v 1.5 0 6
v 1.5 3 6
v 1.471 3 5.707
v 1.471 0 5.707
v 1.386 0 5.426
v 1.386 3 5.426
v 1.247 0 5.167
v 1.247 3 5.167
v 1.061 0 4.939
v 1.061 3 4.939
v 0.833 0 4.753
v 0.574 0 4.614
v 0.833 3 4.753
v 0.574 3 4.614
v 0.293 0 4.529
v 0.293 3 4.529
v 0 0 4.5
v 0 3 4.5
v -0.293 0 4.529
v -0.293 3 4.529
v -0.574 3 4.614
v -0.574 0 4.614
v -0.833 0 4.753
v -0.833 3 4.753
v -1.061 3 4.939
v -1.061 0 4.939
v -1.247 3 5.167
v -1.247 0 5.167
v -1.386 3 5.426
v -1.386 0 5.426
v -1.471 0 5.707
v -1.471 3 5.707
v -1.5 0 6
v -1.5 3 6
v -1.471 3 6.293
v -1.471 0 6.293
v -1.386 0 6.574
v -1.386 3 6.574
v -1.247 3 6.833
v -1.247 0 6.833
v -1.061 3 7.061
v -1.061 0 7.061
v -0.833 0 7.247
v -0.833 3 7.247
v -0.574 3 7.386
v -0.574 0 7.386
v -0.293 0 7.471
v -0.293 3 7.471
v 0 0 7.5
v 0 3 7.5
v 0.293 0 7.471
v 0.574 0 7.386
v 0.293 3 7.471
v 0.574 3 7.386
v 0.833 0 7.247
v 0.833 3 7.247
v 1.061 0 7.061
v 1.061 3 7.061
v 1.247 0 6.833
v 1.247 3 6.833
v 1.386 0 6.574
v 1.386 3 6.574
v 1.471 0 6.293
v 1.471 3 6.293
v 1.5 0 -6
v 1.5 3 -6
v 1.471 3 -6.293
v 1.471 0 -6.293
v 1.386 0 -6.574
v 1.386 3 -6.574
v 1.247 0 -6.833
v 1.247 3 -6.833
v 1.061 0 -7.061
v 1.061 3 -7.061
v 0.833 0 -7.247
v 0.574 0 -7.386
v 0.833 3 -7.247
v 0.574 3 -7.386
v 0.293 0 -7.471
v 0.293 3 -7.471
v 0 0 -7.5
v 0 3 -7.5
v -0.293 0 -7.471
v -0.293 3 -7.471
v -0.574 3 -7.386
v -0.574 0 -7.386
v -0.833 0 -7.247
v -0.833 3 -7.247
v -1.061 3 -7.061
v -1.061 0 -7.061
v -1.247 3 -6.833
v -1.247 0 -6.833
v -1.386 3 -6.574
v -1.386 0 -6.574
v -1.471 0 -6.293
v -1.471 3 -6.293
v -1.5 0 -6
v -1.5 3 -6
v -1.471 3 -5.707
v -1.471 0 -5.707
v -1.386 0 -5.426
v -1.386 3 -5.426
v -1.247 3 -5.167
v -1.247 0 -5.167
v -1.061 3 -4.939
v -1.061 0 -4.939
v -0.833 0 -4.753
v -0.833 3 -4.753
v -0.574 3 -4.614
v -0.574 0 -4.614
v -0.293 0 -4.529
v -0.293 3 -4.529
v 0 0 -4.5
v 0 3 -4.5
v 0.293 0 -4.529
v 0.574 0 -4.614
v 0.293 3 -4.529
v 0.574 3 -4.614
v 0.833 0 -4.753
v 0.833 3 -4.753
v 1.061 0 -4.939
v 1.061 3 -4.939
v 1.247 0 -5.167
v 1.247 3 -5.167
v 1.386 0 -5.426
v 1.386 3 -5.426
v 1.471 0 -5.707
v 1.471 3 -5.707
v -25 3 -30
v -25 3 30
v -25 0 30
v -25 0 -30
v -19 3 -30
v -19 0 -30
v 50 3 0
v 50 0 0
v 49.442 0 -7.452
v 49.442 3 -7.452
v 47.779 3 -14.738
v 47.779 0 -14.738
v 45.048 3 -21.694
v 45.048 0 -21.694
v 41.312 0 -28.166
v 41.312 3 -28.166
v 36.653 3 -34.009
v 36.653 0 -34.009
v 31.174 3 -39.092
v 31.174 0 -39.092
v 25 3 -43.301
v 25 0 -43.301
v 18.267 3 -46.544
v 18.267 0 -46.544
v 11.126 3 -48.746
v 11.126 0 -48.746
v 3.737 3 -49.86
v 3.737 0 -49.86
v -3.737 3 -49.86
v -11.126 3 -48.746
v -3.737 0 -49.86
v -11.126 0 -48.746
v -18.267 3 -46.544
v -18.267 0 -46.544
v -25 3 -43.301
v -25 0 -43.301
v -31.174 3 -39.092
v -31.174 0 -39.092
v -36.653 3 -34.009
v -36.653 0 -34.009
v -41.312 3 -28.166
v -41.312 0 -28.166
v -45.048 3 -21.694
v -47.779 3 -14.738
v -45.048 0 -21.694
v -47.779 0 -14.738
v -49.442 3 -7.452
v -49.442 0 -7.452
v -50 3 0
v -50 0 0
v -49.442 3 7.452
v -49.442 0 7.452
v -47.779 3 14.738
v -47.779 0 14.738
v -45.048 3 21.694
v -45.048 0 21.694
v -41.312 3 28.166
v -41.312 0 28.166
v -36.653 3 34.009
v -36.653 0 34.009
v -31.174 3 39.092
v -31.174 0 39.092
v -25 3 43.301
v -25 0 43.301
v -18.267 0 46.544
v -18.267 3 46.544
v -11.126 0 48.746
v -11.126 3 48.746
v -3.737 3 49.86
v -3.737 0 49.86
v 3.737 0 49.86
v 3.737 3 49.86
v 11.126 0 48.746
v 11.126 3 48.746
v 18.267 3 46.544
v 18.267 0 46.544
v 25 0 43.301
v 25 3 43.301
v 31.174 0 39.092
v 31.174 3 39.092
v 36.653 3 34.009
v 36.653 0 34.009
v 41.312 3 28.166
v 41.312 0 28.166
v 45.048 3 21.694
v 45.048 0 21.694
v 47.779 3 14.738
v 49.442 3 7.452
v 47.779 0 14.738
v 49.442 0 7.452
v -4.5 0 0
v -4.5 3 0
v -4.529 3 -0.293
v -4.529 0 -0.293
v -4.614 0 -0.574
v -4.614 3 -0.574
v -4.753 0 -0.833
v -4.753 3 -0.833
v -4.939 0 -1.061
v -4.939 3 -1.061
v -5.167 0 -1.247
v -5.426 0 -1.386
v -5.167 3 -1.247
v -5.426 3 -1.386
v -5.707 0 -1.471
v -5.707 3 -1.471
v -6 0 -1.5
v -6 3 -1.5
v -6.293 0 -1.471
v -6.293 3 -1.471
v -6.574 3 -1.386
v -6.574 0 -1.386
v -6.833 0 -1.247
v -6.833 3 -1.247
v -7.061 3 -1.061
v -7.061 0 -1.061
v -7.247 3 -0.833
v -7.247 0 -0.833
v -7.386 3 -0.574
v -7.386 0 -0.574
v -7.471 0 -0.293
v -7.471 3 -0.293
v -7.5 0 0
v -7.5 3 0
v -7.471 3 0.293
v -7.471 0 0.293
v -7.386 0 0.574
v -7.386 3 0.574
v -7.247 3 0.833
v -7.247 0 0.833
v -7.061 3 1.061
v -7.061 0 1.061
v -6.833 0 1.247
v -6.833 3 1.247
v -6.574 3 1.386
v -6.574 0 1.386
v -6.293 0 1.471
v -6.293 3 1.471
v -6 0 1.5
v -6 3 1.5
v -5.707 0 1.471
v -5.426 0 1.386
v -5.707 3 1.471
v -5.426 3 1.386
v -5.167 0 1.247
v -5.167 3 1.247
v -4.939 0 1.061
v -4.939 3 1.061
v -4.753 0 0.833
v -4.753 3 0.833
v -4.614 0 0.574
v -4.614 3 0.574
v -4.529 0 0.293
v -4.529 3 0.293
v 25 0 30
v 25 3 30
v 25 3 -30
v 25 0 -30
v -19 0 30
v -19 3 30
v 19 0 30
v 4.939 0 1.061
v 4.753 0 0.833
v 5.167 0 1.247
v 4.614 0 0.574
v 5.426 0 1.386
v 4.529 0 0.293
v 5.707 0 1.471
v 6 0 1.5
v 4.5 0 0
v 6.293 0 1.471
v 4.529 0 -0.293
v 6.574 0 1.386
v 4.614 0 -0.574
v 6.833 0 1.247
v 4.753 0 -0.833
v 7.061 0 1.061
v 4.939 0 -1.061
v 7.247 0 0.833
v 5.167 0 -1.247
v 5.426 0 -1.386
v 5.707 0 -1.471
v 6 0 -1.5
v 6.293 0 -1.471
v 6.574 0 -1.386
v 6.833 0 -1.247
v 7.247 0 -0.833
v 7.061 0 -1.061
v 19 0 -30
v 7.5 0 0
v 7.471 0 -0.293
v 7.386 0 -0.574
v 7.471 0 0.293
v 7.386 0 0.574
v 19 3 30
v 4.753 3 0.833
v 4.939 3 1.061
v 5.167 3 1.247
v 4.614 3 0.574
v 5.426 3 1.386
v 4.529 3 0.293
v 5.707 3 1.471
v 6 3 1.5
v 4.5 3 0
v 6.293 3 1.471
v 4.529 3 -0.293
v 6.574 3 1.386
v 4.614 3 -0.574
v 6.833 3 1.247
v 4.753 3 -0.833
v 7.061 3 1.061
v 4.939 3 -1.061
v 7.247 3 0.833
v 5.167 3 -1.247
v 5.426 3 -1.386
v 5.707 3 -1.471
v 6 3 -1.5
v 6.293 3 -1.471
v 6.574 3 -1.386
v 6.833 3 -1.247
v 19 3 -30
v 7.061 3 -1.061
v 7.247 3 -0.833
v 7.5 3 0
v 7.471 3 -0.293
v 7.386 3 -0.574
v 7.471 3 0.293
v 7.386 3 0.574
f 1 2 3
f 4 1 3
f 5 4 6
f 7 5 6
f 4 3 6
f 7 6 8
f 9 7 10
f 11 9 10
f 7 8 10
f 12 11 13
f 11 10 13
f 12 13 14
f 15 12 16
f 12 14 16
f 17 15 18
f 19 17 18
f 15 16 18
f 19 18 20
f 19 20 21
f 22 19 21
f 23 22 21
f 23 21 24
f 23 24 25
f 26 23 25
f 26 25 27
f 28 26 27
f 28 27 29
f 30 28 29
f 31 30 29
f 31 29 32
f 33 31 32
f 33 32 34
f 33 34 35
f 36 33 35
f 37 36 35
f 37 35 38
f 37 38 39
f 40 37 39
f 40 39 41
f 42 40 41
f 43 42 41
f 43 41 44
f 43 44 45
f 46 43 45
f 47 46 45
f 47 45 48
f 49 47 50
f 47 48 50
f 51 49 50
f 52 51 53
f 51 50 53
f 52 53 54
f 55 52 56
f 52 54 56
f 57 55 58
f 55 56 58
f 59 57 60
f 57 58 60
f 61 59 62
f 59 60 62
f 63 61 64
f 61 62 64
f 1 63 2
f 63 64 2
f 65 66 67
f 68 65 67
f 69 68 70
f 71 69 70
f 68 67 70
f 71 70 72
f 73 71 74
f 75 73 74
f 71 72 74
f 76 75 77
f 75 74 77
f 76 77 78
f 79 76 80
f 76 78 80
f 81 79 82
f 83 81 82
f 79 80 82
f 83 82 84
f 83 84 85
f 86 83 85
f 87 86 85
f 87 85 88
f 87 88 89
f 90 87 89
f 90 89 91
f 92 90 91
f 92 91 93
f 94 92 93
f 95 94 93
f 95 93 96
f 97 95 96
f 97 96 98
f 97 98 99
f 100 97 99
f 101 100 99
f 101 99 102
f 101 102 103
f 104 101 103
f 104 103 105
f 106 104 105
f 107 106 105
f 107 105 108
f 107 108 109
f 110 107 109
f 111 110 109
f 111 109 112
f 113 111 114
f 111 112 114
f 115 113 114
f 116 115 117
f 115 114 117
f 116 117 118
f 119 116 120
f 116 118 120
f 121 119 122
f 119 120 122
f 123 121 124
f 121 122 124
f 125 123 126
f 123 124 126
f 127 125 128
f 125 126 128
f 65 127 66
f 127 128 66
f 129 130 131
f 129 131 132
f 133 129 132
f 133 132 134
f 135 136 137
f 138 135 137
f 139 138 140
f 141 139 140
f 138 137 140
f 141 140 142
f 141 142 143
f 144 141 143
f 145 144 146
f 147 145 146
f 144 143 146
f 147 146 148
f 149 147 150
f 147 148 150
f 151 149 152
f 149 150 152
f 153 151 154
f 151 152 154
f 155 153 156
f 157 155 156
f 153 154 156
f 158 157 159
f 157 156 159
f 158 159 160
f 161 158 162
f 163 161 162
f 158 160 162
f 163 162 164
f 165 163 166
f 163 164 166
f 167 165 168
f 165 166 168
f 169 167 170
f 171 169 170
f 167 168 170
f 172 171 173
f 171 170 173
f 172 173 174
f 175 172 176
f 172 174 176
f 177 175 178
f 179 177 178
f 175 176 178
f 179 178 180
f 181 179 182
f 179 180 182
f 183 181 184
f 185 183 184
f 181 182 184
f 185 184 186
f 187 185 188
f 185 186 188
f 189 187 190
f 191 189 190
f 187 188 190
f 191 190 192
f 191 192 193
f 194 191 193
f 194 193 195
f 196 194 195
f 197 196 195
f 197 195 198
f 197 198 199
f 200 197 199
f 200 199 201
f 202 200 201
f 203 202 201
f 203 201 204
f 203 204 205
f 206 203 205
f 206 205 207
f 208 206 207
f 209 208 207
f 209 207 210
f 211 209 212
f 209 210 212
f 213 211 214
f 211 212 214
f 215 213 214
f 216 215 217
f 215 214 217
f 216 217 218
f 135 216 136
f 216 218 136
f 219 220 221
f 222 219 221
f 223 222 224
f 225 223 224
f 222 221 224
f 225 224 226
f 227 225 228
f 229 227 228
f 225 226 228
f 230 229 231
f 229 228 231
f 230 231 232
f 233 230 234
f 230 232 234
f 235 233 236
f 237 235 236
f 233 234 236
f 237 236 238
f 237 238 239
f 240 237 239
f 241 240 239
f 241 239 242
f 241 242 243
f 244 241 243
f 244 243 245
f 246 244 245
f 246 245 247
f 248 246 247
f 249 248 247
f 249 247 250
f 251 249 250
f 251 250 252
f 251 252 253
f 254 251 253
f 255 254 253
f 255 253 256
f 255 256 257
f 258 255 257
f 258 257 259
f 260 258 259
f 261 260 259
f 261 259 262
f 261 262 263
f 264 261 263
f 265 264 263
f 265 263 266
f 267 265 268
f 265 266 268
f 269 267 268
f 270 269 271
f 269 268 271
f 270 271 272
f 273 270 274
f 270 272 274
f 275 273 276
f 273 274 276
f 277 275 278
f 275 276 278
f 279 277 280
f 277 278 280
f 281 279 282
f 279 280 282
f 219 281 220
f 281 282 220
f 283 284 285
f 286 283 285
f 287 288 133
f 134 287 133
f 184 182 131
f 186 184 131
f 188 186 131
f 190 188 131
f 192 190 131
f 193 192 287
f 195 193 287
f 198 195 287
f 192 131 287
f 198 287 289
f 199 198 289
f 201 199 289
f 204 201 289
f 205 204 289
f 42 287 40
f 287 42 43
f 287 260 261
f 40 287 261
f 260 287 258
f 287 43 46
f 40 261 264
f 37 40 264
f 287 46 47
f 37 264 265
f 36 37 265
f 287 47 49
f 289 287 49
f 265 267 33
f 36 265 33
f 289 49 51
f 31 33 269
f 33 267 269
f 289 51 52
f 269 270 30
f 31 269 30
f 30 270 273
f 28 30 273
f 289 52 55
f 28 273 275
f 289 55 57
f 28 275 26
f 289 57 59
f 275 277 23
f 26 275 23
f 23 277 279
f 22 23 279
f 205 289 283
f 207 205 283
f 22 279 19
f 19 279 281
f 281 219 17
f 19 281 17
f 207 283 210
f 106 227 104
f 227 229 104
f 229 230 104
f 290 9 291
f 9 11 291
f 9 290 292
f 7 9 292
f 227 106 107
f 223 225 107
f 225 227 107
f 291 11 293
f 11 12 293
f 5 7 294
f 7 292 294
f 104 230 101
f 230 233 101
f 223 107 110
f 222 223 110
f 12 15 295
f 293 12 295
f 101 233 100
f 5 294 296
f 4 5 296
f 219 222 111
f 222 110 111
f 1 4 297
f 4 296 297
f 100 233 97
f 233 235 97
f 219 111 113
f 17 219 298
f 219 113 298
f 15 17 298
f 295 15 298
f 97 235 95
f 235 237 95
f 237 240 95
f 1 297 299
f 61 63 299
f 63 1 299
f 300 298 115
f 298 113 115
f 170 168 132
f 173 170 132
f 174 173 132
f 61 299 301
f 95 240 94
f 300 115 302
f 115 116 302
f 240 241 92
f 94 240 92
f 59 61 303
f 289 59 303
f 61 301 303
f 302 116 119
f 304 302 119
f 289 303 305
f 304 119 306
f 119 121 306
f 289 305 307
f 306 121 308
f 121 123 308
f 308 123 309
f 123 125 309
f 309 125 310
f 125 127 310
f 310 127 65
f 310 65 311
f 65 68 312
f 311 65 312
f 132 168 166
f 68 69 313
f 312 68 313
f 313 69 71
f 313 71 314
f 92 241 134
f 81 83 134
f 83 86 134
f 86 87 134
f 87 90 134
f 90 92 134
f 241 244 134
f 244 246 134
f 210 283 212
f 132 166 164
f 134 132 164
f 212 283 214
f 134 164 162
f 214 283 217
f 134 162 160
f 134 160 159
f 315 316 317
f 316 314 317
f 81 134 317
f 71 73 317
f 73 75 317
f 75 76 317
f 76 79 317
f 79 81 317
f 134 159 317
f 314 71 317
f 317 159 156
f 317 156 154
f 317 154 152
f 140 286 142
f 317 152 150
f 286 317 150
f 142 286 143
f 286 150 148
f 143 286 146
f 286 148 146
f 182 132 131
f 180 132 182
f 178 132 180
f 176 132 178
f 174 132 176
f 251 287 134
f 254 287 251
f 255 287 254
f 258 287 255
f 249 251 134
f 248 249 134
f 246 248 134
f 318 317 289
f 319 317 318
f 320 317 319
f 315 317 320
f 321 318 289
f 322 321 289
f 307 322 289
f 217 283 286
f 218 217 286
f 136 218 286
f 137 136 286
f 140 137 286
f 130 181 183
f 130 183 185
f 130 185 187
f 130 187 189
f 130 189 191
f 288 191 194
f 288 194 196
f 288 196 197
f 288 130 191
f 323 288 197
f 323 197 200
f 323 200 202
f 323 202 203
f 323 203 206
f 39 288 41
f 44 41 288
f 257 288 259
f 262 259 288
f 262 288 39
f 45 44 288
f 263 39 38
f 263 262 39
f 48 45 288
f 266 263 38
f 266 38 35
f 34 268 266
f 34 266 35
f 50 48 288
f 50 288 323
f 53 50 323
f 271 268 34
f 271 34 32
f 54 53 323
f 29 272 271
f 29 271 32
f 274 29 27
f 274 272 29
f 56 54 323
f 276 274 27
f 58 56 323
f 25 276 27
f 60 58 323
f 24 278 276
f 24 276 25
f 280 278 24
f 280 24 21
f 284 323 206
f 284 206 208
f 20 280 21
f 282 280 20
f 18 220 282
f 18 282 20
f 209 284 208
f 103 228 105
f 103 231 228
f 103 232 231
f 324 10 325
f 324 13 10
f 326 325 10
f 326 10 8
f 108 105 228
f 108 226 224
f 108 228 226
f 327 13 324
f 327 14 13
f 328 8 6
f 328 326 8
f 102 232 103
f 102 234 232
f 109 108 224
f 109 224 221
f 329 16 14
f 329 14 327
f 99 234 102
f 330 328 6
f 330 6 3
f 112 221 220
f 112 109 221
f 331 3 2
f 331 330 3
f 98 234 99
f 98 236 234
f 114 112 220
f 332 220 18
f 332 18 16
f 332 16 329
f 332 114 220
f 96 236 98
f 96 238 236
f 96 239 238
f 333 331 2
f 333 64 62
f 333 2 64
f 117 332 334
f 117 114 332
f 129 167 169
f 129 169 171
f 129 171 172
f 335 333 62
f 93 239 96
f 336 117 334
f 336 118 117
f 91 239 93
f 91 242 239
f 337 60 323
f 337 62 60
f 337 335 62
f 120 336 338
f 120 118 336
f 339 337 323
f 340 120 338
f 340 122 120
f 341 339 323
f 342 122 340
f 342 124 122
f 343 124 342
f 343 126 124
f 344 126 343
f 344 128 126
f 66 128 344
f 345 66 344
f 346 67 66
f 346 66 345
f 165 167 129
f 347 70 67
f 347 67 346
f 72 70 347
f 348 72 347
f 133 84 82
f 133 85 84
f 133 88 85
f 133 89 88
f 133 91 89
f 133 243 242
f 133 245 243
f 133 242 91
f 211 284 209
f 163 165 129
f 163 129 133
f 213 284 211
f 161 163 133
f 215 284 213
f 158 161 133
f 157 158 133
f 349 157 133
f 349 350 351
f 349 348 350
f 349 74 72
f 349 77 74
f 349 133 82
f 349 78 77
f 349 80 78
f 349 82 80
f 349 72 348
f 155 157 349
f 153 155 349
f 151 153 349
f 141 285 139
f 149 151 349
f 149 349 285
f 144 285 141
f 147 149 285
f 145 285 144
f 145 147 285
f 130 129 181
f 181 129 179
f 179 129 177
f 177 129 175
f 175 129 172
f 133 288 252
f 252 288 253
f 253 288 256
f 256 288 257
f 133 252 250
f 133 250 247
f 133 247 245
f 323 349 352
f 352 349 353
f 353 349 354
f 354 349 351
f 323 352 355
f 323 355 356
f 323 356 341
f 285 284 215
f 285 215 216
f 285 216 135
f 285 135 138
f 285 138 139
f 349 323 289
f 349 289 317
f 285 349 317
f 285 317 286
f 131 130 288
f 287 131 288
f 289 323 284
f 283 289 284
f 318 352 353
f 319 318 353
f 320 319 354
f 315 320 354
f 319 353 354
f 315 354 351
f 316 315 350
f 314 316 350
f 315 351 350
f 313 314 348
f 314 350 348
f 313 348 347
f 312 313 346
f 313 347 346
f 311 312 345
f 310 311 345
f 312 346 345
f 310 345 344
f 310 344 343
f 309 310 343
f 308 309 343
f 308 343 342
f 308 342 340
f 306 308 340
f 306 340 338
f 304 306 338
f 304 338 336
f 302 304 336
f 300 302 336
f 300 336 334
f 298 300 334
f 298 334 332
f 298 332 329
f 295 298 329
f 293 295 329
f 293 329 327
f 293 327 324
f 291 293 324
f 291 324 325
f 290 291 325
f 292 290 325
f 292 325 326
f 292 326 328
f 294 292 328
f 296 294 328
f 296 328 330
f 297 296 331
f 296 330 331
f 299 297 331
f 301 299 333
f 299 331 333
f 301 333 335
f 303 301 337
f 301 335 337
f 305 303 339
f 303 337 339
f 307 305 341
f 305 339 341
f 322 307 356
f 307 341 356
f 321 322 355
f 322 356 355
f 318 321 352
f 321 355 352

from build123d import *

# Parameters (mm, degrees)
CROQUIS1_R              = 50
SALIENTE_EXTRUIR1_DEPTH = 3
CORTAR_EXTRUIR1_REACH   = 5
CROQUIS2_R              = 1.5
CORTAR_EXTRUIR2_REACH   = 5
CROQUIS3_W              = 6
CROQUIS3_H              = 60


with BuildPart() as part:
    # Croquis1 → Saliente-Extruir1 (new body)
    with BuildSketch(Plane(origin=(0, 0, 0), x_dir=(1, 0, 0), z_dir=(0, 1, 0))):
        Circle(CROQUIS1_R)
    extrude(amount=SALIENTE_EXTRUIR1_DEPTH)

    # Croquis2 → Cortar-Extruir1 (cut, up to next)
    with BuildSketch(Plane(origin=(0, 3, 0), x_dir=(1, 0, 0), z_dir=(0, 1, 0)), mode=Mode.PRIVATE) as cortar_extruir1_sk1:
        with Locations((0, 6)):
            Circle(CROQUIS2_R)
    cortar_extruir1_tool1 = extrude(cortar_extruir1_sk1.sketch, amount=-CORTAR_EXTRUIR1_REACH, mode=Mode.PRIVATE) & part.part
    add(cortar_extruir1_tool1.solids().sort_by_distance((0, 3, -6))[0], mode=Mode.SUBTRACT)
    # Croquis2 → Cortar-Extruir1 (cut, up to next)
    with BuildSketch(Plane(origin=(0, 3, 0), x_dir=(1, 0, 0), z_dir=(0, 1, 0)), mode=Mode.PRIVATE) as cortar_extruir1_sk2:
        with Locations((6, 0)):
            Circle(CROQUIS2_R)
    cortar_extruir1_tool2 = extrude(cortar_extruir1_sk2.sketch, amount=-CORTAR_EXTRUIR1_REACH, mode=Mode.PRIVATE) & part.part
    add(cortar_extruir1_tool2.solids().sort_by_distance((6, 3, 0))[0], mode=Mode.SUBTRACT)
    # Croquis2 → Cortar-Extruir1 (cut, up to next)
    with BuildSketch(Plane(origin=(0, 3, 0), x_dir=(1, 0, 0), z_dir=(0, 1, 0)), mode=Mode.PRIVATE) as cortar_extruir1_sk3:
        with Locations((0, -6)):
            Circle(CROQUIS2_R)
    cortar_extruir1_tool3 = extrude(cortar_extruir1_sk3.sketch, amount=-CORTAR_EXTRUIR1_REACH, mode=Mode.PRIVATE) & part.part
    add(cortar_extruir1_tool3.solids().sort_by_distance((0, 3, 6))[0], mode=Mode.SUBTRACT)
    # Croquis2 → Cortar-Extruir1 (cut, up to next)
    with BuildSketch(Plane(origin=(0, 3, 0), x_dir=(1, 0, 0), z_dir=(0, 1, 0)), mode=Mode.PRIVATE) as cortar_extruir1_sk4:
        with Locations((-6, 0)):
            Circle(CROQUIS2_R)
    cortar_extruir1_tool4 = extrude(cortar_extruir1_sk4.sketch, amount=-CORTAR_EXTRUIR1_REACH, mode=Mode.PRIVATE) & part.part
    add(cortar_extruir1_tool4.solids().sort_by_distance((-6, 3, 0))[0], mode=Mode.SUBTRACT)

    # Croquis3 → Cortar-Extruir2 (cut, up to next)
    with BuildSketch(Plane(origin=(0, 3, 0), x_dir=(1, 0, 0), z_dir=(0, 1, 0)), mode=Mode.PRIVATE) as cortar_extruir2_sk1:
        with Locations((22, 0)):
            Rectangle(CROQUIS3_W, CROQUIS3_H)
    cortar_extruir2_tool1 = extrude(cortar_extruir2_sk1.sketch, amount=-CORTAR_EXTRUIR2_REACH, mode=Mode.PRIVATE) & part.part
    add(cortar_extruir2_tool1.solids().sort_by_distance((22, 3, 0))[0], mode=Mode.SUBTRACT)
    # Croquis3 → Cortar-Extruir2 (cut, up to next)
    with BuildSketch(Plane(origin=(0, 3, 0), x_dir=(1, 0, 0), z_dir=(0, 1, 0)), mode=Mode.PRIVATE) as cortar_extruir2_sk2:
        with Locations((-22, 0)):
            Rectangle(CROQUIS3_W, CROQUIS3_H)
    cortar_extruir2_tool2 = extrude(cortar_extruir2_sk2.sketch, amount=-CORTAR_EXTRUIR2_REACH, mode=Mode.PRIVATE) & part.part
    add(cortar_extruir2_tool2.solids().sort_by_distance((-22, 3, 0))[0], mode=Mode.SUBTRACT)


solid = part.part
